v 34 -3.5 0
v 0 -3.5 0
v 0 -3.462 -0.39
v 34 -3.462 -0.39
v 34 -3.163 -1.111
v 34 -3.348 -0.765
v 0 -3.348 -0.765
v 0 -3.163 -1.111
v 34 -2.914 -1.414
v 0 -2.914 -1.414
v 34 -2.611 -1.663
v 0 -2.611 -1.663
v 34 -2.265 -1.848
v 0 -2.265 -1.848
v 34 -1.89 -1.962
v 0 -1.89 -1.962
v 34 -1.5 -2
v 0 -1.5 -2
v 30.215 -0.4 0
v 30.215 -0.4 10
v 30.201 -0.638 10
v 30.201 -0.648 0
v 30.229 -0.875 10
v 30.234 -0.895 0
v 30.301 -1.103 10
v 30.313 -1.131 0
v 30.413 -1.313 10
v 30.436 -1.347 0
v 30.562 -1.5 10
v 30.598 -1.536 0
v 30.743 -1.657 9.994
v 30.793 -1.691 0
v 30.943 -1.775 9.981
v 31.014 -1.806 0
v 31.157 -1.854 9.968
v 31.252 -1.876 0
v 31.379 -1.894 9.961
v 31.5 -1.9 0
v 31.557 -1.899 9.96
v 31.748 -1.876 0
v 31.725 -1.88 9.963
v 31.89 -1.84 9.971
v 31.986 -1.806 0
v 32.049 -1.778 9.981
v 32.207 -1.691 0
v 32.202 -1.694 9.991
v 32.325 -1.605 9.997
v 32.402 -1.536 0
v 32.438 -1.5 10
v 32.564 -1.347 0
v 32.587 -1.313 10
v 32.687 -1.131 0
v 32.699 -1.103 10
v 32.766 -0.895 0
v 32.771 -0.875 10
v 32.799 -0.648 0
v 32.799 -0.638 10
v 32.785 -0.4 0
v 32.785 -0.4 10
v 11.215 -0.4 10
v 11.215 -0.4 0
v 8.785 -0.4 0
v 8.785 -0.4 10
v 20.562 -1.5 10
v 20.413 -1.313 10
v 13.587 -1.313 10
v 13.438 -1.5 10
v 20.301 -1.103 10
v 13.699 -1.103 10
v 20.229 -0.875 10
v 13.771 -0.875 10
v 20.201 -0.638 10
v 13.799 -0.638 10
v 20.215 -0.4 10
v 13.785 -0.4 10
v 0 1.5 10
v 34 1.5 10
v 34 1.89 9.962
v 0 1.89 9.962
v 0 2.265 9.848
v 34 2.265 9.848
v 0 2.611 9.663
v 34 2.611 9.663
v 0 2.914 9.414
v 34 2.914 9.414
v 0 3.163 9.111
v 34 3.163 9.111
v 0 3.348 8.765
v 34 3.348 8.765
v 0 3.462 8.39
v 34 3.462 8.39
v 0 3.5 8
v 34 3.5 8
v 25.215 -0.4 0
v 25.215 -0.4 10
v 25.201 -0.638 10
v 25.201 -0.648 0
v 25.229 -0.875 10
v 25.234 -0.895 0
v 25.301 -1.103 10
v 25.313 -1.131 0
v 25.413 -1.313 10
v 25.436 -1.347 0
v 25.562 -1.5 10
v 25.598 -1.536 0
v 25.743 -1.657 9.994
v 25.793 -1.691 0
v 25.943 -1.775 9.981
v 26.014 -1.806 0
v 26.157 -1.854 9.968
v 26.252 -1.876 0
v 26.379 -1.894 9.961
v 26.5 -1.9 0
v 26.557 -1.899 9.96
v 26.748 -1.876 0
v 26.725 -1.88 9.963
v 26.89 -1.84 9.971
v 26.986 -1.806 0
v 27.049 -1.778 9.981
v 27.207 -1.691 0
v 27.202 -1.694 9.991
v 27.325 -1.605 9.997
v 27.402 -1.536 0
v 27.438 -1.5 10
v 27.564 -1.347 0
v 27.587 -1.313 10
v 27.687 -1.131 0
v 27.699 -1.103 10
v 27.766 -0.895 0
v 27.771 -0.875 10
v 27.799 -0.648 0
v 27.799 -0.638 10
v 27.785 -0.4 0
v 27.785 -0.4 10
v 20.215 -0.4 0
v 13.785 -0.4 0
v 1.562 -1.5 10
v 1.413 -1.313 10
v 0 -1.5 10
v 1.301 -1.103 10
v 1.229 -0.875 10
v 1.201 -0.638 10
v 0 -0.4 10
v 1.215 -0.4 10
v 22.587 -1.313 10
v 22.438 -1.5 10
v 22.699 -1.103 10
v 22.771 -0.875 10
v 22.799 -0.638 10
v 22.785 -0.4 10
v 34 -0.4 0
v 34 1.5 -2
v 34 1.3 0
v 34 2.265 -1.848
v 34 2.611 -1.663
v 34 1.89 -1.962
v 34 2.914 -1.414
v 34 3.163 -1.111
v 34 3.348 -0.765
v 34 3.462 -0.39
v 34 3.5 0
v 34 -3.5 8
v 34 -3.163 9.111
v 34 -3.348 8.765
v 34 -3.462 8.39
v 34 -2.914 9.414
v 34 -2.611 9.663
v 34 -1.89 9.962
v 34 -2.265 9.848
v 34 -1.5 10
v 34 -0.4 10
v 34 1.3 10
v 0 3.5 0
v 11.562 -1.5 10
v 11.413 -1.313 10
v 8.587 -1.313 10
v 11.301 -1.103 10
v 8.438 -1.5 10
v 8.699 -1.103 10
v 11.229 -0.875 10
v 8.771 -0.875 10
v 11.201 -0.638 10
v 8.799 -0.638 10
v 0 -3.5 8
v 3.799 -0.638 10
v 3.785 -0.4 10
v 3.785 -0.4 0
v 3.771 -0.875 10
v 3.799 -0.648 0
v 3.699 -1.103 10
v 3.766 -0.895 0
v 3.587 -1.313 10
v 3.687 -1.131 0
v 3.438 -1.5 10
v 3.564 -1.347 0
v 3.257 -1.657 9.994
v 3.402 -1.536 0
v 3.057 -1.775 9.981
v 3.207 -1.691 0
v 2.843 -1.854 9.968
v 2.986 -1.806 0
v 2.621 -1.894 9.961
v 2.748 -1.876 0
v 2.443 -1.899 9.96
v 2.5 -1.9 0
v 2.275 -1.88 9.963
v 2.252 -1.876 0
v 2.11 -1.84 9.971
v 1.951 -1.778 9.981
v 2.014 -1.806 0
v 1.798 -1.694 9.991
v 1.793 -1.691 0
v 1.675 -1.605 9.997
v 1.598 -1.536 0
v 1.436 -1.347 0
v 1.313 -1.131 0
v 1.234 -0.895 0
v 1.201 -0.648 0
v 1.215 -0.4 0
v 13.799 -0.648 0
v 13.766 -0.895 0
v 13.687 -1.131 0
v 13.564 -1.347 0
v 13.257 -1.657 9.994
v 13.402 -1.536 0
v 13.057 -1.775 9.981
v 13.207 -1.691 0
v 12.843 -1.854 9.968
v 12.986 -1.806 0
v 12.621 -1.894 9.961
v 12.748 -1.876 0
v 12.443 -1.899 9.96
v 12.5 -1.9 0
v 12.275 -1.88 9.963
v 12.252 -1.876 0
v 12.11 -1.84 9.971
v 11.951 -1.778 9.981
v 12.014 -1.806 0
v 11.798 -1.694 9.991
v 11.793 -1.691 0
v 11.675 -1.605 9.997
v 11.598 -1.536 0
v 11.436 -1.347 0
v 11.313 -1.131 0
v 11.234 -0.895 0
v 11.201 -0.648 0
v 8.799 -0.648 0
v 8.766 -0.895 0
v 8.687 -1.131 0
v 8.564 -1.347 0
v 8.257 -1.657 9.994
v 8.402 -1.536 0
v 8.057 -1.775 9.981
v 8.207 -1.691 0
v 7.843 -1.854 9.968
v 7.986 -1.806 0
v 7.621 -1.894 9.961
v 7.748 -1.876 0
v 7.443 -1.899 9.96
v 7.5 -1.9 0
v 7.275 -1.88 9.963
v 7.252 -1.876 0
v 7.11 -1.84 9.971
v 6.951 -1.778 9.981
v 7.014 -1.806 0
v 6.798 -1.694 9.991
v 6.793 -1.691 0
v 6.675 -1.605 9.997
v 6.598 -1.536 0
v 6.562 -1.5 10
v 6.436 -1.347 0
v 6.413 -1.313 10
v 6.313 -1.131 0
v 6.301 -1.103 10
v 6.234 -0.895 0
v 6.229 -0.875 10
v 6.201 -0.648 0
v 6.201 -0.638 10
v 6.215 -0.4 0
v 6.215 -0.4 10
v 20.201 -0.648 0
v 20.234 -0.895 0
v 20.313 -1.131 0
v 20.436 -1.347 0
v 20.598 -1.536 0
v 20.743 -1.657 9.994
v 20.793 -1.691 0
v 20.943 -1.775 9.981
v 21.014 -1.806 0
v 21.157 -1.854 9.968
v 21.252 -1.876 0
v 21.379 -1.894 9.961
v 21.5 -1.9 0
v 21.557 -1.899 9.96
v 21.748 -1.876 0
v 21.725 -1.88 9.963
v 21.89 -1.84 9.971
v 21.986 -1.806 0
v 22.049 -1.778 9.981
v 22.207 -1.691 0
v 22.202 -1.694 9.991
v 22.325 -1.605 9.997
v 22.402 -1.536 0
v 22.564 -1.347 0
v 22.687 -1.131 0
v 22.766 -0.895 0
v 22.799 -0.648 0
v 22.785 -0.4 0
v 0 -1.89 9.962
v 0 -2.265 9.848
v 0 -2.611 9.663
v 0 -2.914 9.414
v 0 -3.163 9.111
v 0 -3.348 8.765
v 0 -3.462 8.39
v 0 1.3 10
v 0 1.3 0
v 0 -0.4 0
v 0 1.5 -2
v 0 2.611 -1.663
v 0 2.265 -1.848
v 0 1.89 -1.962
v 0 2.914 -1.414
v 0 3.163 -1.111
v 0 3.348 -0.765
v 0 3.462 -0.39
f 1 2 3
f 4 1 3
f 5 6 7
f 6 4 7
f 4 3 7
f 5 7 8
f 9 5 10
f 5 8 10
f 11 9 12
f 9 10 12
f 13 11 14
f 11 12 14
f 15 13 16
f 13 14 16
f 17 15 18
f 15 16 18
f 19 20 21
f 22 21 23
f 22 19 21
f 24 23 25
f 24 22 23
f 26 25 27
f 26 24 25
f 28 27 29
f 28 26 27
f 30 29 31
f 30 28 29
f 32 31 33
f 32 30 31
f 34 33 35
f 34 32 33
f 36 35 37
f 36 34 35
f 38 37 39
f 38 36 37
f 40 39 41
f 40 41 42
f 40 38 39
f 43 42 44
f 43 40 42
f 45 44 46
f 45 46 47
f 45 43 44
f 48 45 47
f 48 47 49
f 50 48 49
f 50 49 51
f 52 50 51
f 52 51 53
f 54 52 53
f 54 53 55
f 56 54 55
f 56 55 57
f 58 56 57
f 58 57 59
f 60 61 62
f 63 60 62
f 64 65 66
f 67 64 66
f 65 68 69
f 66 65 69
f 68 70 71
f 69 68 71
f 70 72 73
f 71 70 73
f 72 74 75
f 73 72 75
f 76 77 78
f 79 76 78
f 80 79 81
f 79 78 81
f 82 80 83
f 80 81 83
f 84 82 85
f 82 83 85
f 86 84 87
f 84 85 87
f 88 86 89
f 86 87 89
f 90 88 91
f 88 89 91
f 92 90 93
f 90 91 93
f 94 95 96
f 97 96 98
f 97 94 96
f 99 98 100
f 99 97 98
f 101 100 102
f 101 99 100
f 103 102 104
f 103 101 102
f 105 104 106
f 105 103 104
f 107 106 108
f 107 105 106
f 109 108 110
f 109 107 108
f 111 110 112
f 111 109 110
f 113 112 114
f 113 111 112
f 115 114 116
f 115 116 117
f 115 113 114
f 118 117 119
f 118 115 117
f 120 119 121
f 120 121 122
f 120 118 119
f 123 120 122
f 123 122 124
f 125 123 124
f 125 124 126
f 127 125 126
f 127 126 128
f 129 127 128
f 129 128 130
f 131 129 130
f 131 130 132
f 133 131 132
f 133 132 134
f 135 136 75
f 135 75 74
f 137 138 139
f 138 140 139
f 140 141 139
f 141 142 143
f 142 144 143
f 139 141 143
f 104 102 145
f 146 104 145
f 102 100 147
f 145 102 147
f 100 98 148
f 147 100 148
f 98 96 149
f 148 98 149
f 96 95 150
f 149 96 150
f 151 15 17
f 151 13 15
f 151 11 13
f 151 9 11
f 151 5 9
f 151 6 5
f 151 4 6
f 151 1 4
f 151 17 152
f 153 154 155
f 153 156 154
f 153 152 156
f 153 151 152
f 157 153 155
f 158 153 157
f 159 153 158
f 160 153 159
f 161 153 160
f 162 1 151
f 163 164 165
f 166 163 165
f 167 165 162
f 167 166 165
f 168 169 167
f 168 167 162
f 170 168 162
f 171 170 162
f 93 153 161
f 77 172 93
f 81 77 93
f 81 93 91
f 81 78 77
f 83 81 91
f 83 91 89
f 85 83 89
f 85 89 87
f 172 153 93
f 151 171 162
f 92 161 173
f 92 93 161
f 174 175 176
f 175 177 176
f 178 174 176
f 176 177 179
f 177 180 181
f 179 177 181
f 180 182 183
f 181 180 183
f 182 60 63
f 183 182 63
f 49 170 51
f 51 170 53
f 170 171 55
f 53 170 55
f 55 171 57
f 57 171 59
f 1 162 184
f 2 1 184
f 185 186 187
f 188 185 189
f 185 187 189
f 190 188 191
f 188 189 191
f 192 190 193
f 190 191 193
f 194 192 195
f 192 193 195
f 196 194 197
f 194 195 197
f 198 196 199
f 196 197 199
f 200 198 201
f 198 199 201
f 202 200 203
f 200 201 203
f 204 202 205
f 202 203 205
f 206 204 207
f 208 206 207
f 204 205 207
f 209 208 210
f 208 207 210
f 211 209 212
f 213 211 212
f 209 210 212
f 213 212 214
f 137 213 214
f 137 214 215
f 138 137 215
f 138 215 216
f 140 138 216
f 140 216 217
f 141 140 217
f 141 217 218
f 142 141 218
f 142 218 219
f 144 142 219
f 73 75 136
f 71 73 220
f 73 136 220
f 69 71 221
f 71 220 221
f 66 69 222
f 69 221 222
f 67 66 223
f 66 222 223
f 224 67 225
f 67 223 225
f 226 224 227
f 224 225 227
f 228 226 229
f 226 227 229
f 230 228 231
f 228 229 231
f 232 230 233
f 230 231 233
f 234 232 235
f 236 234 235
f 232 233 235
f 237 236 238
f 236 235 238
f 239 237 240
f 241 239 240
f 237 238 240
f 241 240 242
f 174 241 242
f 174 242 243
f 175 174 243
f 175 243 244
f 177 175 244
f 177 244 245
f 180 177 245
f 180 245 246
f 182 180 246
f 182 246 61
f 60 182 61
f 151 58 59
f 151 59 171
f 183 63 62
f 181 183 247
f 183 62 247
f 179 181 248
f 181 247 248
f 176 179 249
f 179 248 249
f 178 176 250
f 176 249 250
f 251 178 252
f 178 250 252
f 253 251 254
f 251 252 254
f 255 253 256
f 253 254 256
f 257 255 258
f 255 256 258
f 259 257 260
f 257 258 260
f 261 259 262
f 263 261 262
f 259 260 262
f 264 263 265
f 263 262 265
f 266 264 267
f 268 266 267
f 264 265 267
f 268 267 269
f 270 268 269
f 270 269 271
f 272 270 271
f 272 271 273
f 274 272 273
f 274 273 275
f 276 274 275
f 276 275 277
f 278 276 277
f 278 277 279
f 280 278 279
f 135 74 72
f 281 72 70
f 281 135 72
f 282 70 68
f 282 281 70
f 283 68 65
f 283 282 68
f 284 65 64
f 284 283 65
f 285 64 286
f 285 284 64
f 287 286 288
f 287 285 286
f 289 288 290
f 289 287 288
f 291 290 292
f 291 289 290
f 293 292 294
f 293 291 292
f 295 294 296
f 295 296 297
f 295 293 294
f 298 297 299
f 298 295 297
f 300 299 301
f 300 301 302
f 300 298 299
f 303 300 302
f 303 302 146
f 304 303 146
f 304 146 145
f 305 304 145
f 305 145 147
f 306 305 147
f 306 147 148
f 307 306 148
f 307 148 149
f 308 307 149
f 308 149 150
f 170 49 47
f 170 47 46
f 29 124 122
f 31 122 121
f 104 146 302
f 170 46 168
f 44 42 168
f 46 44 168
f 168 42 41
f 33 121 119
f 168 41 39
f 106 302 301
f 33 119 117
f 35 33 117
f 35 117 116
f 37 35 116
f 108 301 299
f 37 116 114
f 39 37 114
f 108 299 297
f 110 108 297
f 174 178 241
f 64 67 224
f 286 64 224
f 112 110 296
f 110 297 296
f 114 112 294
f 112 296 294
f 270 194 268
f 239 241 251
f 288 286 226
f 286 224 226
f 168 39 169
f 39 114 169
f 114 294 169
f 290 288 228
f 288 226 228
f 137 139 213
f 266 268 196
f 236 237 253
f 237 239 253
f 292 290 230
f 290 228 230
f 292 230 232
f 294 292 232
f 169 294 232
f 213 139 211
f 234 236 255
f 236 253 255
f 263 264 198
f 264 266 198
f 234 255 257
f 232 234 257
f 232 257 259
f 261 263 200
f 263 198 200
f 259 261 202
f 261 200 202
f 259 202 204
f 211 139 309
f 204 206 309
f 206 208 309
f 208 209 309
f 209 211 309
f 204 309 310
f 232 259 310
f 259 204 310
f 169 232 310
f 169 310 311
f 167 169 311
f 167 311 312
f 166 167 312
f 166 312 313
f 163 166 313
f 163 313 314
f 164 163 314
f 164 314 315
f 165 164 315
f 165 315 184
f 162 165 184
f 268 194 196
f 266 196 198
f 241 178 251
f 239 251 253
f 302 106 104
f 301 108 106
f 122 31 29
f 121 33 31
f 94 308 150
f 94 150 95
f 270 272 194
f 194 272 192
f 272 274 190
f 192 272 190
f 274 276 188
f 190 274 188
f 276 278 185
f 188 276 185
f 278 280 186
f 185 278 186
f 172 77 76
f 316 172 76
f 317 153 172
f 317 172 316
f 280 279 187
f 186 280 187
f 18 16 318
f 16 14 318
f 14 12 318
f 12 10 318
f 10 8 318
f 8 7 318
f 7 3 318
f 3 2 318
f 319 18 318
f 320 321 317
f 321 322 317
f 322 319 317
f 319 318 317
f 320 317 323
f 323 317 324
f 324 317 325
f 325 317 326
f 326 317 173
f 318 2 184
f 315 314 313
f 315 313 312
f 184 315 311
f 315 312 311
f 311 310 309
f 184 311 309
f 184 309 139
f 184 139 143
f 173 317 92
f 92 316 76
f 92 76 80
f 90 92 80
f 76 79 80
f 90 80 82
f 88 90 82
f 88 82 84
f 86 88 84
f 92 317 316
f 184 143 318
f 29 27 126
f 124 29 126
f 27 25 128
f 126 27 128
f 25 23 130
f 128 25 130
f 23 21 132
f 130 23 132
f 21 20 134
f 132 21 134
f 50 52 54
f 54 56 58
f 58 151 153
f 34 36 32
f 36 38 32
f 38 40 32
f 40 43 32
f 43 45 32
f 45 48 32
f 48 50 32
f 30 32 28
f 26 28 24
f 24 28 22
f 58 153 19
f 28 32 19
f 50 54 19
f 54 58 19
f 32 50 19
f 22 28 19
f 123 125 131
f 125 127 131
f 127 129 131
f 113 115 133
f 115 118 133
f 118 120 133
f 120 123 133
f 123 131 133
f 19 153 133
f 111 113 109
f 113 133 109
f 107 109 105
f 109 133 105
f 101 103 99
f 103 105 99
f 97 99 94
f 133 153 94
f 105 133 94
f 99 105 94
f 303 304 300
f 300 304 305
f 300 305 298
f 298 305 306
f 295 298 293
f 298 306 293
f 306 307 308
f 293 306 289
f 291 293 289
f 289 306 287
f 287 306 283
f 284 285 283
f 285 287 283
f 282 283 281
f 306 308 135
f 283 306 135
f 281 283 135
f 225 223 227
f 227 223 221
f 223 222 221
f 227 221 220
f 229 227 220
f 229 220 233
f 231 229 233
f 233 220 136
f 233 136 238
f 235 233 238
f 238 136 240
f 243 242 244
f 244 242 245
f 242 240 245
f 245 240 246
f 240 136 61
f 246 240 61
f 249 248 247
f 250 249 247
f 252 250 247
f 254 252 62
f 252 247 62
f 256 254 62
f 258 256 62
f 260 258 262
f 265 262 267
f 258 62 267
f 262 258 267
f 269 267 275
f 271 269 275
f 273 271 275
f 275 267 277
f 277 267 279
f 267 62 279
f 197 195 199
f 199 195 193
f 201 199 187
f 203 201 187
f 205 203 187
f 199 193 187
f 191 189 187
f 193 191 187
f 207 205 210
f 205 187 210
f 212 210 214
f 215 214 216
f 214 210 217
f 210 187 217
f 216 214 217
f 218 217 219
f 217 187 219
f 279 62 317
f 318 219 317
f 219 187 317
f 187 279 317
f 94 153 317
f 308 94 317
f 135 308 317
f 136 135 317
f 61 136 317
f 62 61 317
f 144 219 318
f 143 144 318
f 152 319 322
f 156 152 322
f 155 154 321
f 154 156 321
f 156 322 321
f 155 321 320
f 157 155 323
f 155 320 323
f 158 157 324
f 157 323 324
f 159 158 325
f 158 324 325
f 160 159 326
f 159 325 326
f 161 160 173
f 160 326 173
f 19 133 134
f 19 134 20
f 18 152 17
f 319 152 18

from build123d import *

# Parameters (mm, degrees)
SKETCH2_W             = 17
SKETCH2_H             = 2.2
BOSS_EXTRUDE1_DEPTH   = 10
BOSS_EXTRUDE1_2_DEPTH = 10
SKETCH2_4_W           = 17
SKETCH2_4_H           = 7
BOSS_EXTRUDE2_DEPTH   = 2
FILLET2_R             = 2


with BuildPart() as part:
    # Sketch2 → Boss-Extrude1 (new body)
    with BuildSketch(Plane.XY):
        with Locations((8.5, 2.4)):
            Rectangle(SKETCH2_W, SKETCH2_H)
    extrude(amount=BOSS_EXTRUDE1_DEPTH)



with BuildPart() as body_2:
    # Sketch2 → Boss-Extrude1 2 (new body)
    with BuildSketch(Plane.XY):
        with BuildLine():
            Line((1.215476742, -0.4), (0, -0.4))
            Line((0, -0.4), (0, -3.5))
            Line((0, -3.5), (17, -3.5))
            Line((17, -3.5), (17, -0.4))
            Line((17, -0.4), (13.784523258, -0.4))
            ThreePointArc((13.784523258, -0.4), (12.5, -1.9), (11.215476742, -0.4))
            Line((11.215476742, -0.4), (8.784523258, -0.4))
            ThreePointArc((8.784523258, -0.4), (7.5, -1.9), (6.215476742, -0.4))
            Line((6.215476742, -0.4), (3.784523258, -0.4))
            ThreePointArc((3.784523258, -0.4), (2.5, -1.9), (1.215476742, -0.4))
        make_face()
    extrude(amount=BOSS_EXTRUDE1_2_DEPTH)


with BuildPart() as part_1:
    add(part.part)

    add(body_2.part)  # Boss-Extrude2 merges body 2
    # Sketch2<4> → Boss-Extrude2 (add)
    with BuildSketch(Plane.XY):
        with Locations((8.5, 0)):
            Rectangle(SKETCH2_4_W, SKETCH2_4_H)
    extrude(amount=-BOSS_EXTRUDE2_DEPTH)

    # Mirror1: part across plane


with BuildPart() as part_2:
    add(part_1.part)
    add(part_1.part.mirror(Plane(origin=(17, 0, 10), x_dir=(0, 0, 1), z_dir=(-1, 0, 0))))

    # Fillet2
    # the kernel refuses this fillet: 2 mm, written as the material it takes off along each edge
    with BuildSketch(Plane(origin=(-5, -3.5, 10), x_dir=(0, 0, -1), z_dir=(1, 0, 0)), Plane(origin=(-5, 3.5, -2), x_dir=(0, 0, 1), z_dir=(1, 0, 0)), Plane(origin=(-5, -3.5, -2), x_dir=(0, 1, 0), z_dir=(1, 0, 0))) as fillet2_piece_1:
        with BuildLine():
            CenterArc((FILLET2_R, FILLET2_R), FILLET2_R, 180, 90)
            Line((0, FILLET2_R), (0, 0))
            Line((0, 0), (FILLET2_R, 0))
        make_face()
    extrude(amount=44, mode=Mode.SUBTRACT)
    with BuildSketch(Plane(origin=(39, 3.5, 10), x_dir=(0, -1, 0), z_dir=(-1, 0, 0))) as fillet2_piece_2:
        with BuildLine():
            CenterArc((FILLET2_R, -FILLET2_R), FILLET2_R, 90, 90)
            Line((0, -FILLET2_R), (0, 0))
            Line((0, 0), (FILLET2_R, 0))
        make_face()
    extrude(amount=44, mode=Mode.SUBTRACT)


solid = part_2.part
